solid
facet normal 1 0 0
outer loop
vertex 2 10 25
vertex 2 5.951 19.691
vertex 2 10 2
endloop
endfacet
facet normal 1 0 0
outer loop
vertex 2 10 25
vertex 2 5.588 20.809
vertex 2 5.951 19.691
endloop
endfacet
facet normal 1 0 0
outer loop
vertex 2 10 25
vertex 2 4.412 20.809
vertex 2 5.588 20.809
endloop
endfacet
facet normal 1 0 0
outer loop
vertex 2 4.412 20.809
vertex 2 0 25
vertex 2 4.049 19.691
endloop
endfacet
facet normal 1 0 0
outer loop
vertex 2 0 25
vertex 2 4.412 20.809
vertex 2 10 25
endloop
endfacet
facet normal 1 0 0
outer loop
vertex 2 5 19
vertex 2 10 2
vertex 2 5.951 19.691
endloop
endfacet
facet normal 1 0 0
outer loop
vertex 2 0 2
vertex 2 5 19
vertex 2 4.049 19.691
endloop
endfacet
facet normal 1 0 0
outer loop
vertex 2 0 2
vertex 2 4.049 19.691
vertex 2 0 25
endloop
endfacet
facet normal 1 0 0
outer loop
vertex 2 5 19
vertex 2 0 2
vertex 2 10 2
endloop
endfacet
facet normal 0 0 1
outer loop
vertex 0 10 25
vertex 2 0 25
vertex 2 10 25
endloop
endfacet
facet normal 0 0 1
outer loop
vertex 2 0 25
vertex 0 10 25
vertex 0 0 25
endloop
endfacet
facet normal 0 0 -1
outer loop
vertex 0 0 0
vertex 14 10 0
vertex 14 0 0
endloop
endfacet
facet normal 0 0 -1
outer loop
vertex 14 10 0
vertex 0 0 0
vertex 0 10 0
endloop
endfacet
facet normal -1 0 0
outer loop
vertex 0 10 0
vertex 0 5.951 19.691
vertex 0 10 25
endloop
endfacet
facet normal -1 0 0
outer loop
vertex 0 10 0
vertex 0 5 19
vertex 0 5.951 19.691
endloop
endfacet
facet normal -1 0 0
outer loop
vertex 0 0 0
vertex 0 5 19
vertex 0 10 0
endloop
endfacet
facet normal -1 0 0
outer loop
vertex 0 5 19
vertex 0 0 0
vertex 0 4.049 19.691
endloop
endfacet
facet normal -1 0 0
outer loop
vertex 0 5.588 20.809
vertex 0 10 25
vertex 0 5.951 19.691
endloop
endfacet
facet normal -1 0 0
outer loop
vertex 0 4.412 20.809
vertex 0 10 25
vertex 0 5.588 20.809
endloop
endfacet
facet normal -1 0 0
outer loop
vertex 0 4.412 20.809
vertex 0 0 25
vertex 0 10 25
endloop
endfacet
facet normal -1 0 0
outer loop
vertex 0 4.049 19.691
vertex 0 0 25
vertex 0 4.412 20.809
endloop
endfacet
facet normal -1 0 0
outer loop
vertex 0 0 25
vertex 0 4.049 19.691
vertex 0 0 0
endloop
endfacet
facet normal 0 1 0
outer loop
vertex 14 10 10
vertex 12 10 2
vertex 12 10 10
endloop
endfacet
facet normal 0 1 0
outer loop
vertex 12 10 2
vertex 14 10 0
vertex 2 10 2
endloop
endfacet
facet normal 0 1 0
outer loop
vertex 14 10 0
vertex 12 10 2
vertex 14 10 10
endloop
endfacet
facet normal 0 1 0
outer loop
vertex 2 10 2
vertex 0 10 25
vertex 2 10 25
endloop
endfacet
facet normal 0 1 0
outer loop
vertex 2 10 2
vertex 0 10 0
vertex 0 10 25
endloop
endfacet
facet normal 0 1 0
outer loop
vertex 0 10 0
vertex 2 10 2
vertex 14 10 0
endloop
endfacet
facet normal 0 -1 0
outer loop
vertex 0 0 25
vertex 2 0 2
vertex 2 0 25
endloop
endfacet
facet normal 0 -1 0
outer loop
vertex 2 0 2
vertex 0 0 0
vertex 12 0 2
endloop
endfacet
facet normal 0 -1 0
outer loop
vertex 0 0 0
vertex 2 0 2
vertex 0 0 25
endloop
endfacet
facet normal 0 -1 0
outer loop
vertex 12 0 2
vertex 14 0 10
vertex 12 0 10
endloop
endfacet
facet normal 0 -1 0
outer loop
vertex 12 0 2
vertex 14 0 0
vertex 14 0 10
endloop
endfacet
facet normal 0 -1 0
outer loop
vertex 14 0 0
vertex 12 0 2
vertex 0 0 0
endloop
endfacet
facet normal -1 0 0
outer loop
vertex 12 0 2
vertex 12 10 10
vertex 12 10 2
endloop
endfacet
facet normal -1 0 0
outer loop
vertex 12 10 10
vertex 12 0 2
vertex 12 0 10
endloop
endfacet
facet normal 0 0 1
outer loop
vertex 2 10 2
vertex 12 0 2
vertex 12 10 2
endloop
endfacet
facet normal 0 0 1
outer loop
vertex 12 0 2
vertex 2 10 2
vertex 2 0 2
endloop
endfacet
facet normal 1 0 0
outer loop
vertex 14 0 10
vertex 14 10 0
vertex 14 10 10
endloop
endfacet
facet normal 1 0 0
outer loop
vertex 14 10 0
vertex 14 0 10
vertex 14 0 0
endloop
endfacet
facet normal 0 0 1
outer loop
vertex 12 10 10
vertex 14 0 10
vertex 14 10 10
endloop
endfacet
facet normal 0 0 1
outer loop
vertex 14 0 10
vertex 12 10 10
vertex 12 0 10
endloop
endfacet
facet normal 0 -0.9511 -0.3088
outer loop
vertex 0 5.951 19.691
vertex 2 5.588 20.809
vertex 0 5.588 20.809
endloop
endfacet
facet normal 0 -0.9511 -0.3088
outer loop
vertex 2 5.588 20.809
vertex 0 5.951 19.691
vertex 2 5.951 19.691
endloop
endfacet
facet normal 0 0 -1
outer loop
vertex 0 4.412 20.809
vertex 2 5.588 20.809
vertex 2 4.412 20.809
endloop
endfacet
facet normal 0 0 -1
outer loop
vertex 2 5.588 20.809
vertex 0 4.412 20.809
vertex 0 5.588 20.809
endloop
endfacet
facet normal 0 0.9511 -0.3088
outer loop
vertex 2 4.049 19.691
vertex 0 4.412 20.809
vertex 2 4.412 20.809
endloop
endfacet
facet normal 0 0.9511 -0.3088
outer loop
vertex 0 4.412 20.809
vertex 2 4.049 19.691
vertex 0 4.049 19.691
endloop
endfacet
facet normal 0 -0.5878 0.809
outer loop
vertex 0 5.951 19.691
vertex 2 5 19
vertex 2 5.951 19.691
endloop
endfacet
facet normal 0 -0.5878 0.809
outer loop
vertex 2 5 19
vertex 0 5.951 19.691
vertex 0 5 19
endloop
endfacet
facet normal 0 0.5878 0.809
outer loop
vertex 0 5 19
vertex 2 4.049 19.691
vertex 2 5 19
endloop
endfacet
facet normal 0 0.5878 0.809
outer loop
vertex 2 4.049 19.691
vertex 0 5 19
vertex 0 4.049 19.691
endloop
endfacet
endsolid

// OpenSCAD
height1 = 25;
width = 10;
thickness = 2;

gap = 10;
height2 = 10;

holeDiameter = 2;
holeFromTop = 5;

difference() {
	union() {
		// Wall
		cube([thickness, width, height1]);

		// Base
		translate([thickness, 0, 0])
			cube([gap, width, thickness]);
		
		// Hook
		translate([gap + thickness, 0, 0])
			cube([thickness, width, height2]);
	}
	rotate([0, 90, 0])
		translate([-(height1 - holeFromTop), width/2, -.1])
		cylinder(thickness + .2, holeDiameter/2.0, holeDiameter/2.0);
}
